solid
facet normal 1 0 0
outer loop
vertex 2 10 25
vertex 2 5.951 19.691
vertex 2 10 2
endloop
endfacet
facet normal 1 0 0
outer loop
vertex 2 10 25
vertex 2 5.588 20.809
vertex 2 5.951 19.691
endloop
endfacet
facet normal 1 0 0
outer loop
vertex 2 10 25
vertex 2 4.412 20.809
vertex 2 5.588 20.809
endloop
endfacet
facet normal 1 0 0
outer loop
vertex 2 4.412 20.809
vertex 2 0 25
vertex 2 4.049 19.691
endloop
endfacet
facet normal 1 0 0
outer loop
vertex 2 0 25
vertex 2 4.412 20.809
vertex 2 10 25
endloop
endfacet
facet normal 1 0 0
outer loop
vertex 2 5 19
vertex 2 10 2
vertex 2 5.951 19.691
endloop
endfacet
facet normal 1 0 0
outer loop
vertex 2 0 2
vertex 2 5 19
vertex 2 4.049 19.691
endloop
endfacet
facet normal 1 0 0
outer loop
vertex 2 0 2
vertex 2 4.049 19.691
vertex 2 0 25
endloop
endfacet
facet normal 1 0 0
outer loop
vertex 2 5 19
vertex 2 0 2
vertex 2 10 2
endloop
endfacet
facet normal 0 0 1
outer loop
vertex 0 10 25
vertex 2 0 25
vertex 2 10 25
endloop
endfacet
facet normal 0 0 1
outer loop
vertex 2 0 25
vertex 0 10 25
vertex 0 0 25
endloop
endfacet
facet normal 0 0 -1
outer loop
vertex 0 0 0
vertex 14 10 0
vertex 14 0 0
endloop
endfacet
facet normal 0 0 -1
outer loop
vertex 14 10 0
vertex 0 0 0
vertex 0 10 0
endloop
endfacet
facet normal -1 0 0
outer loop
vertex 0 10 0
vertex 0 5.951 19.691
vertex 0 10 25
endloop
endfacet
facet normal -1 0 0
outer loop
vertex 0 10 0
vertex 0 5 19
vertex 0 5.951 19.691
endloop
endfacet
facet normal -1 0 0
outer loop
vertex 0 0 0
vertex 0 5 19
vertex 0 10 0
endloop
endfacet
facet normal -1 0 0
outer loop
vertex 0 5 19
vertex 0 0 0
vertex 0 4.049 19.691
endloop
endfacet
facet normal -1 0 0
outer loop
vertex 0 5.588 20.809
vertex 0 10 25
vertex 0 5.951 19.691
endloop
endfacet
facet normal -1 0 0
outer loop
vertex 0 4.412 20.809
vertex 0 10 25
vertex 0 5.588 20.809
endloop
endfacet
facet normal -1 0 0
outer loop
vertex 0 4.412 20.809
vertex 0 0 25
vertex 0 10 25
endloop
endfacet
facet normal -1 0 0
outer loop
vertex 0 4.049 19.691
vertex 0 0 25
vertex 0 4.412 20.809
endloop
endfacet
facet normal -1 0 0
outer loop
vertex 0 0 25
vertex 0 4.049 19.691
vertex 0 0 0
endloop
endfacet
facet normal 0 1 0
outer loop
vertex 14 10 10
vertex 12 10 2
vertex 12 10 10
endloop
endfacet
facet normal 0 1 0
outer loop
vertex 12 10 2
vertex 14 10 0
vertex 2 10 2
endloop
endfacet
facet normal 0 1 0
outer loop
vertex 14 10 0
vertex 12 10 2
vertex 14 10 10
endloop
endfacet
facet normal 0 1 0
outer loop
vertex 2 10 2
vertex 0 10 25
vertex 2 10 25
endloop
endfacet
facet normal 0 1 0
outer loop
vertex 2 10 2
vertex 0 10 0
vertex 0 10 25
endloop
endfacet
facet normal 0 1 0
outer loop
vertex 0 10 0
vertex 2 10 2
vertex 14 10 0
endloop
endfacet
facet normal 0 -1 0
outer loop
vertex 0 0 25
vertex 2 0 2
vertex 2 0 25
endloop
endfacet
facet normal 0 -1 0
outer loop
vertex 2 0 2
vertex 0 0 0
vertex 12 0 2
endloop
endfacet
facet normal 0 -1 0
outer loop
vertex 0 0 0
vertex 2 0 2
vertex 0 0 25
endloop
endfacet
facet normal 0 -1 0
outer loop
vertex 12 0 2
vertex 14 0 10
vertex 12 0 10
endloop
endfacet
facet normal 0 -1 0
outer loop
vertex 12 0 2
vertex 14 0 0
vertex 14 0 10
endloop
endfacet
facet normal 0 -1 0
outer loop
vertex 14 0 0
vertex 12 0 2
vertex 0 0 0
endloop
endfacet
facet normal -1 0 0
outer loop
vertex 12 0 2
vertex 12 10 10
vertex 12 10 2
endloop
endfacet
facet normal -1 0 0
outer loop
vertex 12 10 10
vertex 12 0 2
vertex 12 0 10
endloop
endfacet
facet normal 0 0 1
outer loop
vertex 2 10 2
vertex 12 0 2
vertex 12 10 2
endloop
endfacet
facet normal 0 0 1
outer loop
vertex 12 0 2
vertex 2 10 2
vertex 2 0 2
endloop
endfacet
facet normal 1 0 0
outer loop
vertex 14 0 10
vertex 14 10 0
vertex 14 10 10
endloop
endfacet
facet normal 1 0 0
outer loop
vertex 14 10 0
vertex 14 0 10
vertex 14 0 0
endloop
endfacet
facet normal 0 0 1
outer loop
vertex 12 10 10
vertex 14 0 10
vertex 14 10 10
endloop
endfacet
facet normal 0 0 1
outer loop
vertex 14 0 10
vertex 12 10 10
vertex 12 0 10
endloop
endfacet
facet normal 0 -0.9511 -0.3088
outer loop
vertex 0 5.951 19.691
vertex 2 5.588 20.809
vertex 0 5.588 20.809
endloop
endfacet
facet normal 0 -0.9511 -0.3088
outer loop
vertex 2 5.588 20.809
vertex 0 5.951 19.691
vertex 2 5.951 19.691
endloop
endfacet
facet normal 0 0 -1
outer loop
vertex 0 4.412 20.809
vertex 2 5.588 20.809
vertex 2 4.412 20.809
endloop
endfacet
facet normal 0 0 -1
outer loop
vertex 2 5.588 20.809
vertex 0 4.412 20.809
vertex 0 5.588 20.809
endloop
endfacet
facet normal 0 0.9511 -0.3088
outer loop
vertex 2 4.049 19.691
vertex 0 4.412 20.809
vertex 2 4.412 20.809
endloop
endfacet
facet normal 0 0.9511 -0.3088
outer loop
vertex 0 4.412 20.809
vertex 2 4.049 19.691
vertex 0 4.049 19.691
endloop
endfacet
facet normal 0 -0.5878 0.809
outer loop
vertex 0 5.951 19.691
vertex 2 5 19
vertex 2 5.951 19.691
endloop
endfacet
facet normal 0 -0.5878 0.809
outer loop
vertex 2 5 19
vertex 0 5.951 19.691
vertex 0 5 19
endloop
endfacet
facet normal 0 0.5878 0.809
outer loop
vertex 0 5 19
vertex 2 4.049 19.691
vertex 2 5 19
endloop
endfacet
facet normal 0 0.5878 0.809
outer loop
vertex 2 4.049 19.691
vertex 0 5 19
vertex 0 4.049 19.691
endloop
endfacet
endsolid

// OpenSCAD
height1 = 25;
width = 10;
thickness = 2;

gap = 10;
height2 = 10;

holeDiameter = 2;
holeFromTop = 5;

difference() {
	union() {
		// Wall
		cube([thickness, width, height1]);

		// Base
		translate([thickness, 0, 0])
			cube([gap, width, thickness]);
		
		// Hook
		translate([gap + thickness, 0, 0])
			cube([thickness, width, height2]);
	}
	rotate([0, 90, 0])
		translate([-(height1 - holeFromTop), width/2, -.1])
		cylinder(thickness + .2, holeDiameter/2.0, holeDiameter/2.0);
}
